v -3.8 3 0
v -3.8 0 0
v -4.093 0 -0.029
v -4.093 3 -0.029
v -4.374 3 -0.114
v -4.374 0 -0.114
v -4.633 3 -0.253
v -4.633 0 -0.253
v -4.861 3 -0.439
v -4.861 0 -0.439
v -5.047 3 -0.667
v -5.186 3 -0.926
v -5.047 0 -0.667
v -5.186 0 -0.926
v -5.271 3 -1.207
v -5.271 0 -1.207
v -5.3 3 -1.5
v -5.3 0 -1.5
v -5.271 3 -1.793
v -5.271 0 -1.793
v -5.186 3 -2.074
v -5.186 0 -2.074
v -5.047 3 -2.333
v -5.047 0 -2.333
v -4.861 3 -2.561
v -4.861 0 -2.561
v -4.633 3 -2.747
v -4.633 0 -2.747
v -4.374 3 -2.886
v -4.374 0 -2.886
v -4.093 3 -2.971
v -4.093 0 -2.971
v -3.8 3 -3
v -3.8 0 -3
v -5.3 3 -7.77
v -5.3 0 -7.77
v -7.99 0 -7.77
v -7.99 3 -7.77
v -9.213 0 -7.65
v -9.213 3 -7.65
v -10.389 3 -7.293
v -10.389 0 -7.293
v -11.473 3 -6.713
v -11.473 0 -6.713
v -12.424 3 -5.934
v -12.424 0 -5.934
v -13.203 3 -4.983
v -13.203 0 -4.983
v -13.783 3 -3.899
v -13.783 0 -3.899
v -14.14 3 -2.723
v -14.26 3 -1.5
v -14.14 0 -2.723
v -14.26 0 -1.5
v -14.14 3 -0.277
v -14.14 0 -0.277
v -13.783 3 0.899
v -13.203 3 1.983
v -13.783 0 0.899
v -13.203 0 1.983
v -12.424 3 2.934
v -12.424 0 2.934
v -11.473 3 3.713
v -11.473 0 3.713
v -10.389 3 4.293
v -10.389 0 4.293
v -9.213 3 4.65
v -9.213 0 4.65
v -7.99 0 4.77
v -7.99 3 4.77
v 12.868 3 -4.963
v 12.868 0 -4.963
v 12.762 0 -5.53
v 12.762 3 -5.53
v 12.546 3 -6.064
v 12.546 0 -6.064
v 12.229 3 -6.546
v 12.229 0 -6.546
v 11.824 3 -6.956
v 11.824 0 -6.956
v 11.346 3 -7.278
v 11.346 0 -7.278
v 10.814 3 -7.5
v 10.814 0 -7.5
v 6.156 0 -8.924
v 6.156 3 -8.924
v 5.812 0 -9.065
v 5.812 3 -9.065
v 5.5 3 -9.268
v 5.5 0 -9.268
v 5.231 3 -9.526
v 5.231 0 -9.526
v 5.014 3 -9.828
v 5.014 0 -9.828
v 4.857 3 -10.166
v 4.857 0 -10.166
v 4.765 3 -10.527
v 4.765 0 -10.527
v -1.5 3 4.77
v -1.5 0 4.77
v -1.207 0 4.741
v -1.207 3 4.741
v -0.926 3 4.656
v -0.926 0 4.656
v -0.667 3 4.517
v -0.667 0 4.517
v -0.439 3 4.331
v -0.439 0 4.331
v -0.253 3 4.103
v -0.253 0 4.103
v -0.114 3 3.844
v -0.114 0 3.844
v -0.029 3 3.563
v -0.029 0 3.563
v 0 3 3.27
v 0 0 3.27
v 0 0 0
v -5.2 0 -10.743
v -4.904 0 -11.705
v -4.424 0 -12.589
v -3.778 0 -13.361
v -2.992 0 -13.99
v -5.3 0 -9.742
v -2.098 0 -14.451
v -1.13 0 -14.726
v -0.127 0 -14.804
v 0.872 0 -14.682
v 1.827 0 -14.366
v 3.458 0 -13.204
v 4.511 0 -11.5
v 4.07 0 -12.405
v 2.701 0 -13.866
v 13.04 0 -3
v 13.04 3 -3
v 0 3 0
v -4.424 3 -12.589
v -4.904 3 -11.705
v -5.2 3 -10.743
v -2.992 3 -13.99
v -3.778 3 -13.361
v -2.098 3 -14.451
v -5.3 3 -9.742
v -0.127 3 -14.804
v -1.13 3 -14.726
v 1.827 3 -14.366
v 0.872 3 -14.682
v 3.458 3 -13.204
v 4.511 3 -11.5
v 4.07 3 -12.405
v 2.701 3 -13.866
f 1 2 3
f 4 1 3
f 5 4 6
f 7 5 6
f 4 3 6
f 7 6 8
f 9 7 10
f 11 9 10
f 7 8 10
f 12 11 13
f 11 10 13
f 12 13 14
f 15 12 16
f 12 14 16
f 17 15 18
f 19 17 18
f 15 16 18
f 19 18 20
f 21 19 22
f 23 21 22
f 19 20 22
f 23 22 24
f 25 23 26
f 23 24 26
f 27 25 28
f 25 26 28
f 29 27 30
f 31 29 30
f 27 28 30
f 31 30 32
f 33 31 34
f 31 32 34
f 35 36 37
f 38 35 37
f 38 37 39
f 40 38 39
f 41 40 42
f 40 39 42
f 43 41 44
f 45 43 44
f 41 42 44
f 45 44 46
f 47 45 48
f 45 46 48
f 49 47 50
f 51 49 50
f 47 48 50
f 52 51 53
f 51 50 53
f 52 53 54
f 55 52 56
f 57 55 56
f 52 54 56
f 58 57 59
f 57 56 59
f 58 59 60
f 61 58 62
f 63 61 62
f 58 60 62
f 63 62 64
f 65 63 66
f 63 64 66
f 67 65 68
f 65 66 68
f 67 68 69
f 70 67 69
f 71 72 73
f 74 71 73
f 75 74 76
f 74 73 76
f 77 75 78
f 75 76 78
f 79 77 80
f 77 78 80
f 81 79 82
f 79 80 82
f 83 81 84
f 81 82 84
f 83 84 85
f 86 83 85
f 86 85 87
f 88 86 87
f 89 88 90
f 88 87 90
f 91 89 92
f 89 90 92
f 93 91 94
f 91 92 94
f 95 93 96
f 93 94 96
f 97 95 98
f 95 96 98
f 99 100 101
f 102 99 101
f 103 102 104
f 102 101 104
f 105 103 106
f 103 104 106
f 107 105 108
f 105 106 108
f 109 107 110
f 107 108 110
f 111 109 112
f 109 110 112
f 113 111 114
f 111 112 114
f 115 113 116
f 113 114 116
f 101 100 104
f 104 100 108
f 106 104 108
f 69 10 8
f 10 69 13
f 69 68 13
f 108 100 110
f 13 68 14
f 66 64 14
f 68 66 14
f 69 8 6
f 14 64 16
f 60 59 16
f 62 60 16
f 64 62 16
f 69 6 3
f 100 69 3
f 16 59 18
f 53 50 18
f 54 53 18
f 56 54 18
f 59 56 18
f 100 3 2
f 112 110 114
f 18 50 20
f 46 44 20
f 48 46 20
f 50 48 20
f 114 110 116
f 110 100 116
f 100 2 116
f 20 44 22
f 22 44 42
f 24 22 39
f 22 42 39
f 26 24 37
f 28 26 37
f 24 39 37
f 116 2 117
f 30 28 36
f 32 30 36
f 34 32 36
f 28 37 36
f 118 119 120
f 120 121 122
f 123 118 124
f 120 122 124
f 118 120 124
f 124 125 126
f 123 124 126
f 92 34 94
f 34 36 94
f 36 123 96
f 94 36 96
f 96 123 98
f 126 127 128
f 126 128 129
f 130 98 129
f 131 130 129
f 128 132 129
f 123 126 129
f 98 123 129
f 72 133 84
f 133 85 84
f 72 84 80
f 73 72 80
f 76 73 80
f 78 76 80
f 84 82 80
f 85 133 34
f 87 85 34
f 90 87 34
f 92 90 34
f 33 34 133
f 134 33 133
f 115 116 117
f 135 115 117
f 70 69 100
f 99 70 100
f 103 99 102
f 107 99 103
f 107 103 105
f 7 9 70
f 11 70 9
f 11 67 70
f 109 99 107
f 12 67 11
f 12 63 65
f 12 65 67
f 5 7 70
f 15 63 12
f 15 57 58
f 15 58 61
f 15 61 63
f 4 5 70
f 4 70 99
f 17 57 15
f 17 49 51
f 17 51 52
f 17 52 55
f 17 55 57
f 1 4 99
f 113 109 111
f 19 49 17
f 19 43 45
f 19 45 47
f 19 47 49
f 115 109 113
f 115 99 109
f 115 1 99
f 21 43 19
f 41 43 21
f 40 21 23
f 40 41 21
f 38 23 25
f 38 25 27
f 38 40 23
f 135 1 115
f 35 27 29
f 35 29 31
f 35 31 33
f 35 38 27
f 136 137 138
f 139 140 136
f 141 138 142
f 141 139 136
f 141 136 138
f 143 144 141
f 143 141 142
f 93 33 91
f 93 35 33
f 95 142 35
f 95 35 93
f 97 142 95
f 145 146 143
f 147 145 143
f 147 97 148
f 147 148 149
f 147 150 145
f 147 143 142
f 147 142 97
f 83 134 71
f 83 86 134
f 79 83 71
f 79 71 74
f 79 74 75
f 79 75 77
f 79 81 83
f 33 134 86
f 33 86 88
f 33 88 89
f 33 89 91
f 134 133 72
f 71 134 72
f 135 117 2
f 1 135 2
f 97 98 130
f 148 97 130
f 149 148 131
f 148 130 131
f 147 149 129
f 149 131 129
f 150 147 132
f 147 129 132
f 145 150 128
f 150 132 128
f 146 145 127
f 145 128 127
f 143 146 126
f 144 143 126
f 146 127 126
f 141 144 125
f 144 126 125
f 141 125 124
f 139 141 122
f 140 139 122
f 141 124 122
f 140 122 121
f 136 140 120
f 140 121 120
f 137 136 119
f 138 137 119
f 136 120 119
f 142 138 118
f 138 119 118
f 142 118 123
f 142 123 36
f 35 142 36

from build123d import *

# Parameters (mm, degrees)
BOSS_EXTRUDE2_DEPTH = 3


with BuildPart() as part:
    # Sketch1 → Boss-Extrude2 (new body)
    with BuildSketch(Plane(origin=(0, 0, 0), x_dir=(1, 0, 0), z_dir=(0, 1, 0))):
        with BuildLine():
            Line((0, 0), (-3.8, 0))
            ThreePointArc((-3.8, 0), (-5.3, 1.5), (-3.8, 3))
            Line((-3.8, 3), (13.04, 3))
            Line((13.04, 3), (12.868254879, 4.963055716))
            ThreePointArc((12.868254879, 4.963055716), (12.228877244, 6.545570894), (10.813877905, 7.5))
            Line((10.813877905, 7.5), (6.156299709, 8.923964556))
            ThreePointArc((6.156299709, 8.923964556), (5.230638373, 9.525590656), (4.765198448, 10.526674344))
            ThreePointArc((4.765198448, 10.526674344), (-0.630284052, 14.79), (-5.3, 9.742136094))
            Line((-5.3, 9.742136094), (-5.3, 7.77))
            Line((-5.3, 7.77), (-7.99, 7.77))
            ThreePointArc((-7.99, 7.77), (-14.26, 1.5), (-7.99, -4.77))
            Line((-7.99, -4.77), (-1.5, -4.77))
            ThreePointArc((-1.5, -4.77), (-0.439339828, -4.330660172), (0, -3.27))
            Line((0, -3.27), (0, 0))
        make_face()
    extrude(amount=BOSS_EXTRUDE2_DEPTH)


solid = part.part
